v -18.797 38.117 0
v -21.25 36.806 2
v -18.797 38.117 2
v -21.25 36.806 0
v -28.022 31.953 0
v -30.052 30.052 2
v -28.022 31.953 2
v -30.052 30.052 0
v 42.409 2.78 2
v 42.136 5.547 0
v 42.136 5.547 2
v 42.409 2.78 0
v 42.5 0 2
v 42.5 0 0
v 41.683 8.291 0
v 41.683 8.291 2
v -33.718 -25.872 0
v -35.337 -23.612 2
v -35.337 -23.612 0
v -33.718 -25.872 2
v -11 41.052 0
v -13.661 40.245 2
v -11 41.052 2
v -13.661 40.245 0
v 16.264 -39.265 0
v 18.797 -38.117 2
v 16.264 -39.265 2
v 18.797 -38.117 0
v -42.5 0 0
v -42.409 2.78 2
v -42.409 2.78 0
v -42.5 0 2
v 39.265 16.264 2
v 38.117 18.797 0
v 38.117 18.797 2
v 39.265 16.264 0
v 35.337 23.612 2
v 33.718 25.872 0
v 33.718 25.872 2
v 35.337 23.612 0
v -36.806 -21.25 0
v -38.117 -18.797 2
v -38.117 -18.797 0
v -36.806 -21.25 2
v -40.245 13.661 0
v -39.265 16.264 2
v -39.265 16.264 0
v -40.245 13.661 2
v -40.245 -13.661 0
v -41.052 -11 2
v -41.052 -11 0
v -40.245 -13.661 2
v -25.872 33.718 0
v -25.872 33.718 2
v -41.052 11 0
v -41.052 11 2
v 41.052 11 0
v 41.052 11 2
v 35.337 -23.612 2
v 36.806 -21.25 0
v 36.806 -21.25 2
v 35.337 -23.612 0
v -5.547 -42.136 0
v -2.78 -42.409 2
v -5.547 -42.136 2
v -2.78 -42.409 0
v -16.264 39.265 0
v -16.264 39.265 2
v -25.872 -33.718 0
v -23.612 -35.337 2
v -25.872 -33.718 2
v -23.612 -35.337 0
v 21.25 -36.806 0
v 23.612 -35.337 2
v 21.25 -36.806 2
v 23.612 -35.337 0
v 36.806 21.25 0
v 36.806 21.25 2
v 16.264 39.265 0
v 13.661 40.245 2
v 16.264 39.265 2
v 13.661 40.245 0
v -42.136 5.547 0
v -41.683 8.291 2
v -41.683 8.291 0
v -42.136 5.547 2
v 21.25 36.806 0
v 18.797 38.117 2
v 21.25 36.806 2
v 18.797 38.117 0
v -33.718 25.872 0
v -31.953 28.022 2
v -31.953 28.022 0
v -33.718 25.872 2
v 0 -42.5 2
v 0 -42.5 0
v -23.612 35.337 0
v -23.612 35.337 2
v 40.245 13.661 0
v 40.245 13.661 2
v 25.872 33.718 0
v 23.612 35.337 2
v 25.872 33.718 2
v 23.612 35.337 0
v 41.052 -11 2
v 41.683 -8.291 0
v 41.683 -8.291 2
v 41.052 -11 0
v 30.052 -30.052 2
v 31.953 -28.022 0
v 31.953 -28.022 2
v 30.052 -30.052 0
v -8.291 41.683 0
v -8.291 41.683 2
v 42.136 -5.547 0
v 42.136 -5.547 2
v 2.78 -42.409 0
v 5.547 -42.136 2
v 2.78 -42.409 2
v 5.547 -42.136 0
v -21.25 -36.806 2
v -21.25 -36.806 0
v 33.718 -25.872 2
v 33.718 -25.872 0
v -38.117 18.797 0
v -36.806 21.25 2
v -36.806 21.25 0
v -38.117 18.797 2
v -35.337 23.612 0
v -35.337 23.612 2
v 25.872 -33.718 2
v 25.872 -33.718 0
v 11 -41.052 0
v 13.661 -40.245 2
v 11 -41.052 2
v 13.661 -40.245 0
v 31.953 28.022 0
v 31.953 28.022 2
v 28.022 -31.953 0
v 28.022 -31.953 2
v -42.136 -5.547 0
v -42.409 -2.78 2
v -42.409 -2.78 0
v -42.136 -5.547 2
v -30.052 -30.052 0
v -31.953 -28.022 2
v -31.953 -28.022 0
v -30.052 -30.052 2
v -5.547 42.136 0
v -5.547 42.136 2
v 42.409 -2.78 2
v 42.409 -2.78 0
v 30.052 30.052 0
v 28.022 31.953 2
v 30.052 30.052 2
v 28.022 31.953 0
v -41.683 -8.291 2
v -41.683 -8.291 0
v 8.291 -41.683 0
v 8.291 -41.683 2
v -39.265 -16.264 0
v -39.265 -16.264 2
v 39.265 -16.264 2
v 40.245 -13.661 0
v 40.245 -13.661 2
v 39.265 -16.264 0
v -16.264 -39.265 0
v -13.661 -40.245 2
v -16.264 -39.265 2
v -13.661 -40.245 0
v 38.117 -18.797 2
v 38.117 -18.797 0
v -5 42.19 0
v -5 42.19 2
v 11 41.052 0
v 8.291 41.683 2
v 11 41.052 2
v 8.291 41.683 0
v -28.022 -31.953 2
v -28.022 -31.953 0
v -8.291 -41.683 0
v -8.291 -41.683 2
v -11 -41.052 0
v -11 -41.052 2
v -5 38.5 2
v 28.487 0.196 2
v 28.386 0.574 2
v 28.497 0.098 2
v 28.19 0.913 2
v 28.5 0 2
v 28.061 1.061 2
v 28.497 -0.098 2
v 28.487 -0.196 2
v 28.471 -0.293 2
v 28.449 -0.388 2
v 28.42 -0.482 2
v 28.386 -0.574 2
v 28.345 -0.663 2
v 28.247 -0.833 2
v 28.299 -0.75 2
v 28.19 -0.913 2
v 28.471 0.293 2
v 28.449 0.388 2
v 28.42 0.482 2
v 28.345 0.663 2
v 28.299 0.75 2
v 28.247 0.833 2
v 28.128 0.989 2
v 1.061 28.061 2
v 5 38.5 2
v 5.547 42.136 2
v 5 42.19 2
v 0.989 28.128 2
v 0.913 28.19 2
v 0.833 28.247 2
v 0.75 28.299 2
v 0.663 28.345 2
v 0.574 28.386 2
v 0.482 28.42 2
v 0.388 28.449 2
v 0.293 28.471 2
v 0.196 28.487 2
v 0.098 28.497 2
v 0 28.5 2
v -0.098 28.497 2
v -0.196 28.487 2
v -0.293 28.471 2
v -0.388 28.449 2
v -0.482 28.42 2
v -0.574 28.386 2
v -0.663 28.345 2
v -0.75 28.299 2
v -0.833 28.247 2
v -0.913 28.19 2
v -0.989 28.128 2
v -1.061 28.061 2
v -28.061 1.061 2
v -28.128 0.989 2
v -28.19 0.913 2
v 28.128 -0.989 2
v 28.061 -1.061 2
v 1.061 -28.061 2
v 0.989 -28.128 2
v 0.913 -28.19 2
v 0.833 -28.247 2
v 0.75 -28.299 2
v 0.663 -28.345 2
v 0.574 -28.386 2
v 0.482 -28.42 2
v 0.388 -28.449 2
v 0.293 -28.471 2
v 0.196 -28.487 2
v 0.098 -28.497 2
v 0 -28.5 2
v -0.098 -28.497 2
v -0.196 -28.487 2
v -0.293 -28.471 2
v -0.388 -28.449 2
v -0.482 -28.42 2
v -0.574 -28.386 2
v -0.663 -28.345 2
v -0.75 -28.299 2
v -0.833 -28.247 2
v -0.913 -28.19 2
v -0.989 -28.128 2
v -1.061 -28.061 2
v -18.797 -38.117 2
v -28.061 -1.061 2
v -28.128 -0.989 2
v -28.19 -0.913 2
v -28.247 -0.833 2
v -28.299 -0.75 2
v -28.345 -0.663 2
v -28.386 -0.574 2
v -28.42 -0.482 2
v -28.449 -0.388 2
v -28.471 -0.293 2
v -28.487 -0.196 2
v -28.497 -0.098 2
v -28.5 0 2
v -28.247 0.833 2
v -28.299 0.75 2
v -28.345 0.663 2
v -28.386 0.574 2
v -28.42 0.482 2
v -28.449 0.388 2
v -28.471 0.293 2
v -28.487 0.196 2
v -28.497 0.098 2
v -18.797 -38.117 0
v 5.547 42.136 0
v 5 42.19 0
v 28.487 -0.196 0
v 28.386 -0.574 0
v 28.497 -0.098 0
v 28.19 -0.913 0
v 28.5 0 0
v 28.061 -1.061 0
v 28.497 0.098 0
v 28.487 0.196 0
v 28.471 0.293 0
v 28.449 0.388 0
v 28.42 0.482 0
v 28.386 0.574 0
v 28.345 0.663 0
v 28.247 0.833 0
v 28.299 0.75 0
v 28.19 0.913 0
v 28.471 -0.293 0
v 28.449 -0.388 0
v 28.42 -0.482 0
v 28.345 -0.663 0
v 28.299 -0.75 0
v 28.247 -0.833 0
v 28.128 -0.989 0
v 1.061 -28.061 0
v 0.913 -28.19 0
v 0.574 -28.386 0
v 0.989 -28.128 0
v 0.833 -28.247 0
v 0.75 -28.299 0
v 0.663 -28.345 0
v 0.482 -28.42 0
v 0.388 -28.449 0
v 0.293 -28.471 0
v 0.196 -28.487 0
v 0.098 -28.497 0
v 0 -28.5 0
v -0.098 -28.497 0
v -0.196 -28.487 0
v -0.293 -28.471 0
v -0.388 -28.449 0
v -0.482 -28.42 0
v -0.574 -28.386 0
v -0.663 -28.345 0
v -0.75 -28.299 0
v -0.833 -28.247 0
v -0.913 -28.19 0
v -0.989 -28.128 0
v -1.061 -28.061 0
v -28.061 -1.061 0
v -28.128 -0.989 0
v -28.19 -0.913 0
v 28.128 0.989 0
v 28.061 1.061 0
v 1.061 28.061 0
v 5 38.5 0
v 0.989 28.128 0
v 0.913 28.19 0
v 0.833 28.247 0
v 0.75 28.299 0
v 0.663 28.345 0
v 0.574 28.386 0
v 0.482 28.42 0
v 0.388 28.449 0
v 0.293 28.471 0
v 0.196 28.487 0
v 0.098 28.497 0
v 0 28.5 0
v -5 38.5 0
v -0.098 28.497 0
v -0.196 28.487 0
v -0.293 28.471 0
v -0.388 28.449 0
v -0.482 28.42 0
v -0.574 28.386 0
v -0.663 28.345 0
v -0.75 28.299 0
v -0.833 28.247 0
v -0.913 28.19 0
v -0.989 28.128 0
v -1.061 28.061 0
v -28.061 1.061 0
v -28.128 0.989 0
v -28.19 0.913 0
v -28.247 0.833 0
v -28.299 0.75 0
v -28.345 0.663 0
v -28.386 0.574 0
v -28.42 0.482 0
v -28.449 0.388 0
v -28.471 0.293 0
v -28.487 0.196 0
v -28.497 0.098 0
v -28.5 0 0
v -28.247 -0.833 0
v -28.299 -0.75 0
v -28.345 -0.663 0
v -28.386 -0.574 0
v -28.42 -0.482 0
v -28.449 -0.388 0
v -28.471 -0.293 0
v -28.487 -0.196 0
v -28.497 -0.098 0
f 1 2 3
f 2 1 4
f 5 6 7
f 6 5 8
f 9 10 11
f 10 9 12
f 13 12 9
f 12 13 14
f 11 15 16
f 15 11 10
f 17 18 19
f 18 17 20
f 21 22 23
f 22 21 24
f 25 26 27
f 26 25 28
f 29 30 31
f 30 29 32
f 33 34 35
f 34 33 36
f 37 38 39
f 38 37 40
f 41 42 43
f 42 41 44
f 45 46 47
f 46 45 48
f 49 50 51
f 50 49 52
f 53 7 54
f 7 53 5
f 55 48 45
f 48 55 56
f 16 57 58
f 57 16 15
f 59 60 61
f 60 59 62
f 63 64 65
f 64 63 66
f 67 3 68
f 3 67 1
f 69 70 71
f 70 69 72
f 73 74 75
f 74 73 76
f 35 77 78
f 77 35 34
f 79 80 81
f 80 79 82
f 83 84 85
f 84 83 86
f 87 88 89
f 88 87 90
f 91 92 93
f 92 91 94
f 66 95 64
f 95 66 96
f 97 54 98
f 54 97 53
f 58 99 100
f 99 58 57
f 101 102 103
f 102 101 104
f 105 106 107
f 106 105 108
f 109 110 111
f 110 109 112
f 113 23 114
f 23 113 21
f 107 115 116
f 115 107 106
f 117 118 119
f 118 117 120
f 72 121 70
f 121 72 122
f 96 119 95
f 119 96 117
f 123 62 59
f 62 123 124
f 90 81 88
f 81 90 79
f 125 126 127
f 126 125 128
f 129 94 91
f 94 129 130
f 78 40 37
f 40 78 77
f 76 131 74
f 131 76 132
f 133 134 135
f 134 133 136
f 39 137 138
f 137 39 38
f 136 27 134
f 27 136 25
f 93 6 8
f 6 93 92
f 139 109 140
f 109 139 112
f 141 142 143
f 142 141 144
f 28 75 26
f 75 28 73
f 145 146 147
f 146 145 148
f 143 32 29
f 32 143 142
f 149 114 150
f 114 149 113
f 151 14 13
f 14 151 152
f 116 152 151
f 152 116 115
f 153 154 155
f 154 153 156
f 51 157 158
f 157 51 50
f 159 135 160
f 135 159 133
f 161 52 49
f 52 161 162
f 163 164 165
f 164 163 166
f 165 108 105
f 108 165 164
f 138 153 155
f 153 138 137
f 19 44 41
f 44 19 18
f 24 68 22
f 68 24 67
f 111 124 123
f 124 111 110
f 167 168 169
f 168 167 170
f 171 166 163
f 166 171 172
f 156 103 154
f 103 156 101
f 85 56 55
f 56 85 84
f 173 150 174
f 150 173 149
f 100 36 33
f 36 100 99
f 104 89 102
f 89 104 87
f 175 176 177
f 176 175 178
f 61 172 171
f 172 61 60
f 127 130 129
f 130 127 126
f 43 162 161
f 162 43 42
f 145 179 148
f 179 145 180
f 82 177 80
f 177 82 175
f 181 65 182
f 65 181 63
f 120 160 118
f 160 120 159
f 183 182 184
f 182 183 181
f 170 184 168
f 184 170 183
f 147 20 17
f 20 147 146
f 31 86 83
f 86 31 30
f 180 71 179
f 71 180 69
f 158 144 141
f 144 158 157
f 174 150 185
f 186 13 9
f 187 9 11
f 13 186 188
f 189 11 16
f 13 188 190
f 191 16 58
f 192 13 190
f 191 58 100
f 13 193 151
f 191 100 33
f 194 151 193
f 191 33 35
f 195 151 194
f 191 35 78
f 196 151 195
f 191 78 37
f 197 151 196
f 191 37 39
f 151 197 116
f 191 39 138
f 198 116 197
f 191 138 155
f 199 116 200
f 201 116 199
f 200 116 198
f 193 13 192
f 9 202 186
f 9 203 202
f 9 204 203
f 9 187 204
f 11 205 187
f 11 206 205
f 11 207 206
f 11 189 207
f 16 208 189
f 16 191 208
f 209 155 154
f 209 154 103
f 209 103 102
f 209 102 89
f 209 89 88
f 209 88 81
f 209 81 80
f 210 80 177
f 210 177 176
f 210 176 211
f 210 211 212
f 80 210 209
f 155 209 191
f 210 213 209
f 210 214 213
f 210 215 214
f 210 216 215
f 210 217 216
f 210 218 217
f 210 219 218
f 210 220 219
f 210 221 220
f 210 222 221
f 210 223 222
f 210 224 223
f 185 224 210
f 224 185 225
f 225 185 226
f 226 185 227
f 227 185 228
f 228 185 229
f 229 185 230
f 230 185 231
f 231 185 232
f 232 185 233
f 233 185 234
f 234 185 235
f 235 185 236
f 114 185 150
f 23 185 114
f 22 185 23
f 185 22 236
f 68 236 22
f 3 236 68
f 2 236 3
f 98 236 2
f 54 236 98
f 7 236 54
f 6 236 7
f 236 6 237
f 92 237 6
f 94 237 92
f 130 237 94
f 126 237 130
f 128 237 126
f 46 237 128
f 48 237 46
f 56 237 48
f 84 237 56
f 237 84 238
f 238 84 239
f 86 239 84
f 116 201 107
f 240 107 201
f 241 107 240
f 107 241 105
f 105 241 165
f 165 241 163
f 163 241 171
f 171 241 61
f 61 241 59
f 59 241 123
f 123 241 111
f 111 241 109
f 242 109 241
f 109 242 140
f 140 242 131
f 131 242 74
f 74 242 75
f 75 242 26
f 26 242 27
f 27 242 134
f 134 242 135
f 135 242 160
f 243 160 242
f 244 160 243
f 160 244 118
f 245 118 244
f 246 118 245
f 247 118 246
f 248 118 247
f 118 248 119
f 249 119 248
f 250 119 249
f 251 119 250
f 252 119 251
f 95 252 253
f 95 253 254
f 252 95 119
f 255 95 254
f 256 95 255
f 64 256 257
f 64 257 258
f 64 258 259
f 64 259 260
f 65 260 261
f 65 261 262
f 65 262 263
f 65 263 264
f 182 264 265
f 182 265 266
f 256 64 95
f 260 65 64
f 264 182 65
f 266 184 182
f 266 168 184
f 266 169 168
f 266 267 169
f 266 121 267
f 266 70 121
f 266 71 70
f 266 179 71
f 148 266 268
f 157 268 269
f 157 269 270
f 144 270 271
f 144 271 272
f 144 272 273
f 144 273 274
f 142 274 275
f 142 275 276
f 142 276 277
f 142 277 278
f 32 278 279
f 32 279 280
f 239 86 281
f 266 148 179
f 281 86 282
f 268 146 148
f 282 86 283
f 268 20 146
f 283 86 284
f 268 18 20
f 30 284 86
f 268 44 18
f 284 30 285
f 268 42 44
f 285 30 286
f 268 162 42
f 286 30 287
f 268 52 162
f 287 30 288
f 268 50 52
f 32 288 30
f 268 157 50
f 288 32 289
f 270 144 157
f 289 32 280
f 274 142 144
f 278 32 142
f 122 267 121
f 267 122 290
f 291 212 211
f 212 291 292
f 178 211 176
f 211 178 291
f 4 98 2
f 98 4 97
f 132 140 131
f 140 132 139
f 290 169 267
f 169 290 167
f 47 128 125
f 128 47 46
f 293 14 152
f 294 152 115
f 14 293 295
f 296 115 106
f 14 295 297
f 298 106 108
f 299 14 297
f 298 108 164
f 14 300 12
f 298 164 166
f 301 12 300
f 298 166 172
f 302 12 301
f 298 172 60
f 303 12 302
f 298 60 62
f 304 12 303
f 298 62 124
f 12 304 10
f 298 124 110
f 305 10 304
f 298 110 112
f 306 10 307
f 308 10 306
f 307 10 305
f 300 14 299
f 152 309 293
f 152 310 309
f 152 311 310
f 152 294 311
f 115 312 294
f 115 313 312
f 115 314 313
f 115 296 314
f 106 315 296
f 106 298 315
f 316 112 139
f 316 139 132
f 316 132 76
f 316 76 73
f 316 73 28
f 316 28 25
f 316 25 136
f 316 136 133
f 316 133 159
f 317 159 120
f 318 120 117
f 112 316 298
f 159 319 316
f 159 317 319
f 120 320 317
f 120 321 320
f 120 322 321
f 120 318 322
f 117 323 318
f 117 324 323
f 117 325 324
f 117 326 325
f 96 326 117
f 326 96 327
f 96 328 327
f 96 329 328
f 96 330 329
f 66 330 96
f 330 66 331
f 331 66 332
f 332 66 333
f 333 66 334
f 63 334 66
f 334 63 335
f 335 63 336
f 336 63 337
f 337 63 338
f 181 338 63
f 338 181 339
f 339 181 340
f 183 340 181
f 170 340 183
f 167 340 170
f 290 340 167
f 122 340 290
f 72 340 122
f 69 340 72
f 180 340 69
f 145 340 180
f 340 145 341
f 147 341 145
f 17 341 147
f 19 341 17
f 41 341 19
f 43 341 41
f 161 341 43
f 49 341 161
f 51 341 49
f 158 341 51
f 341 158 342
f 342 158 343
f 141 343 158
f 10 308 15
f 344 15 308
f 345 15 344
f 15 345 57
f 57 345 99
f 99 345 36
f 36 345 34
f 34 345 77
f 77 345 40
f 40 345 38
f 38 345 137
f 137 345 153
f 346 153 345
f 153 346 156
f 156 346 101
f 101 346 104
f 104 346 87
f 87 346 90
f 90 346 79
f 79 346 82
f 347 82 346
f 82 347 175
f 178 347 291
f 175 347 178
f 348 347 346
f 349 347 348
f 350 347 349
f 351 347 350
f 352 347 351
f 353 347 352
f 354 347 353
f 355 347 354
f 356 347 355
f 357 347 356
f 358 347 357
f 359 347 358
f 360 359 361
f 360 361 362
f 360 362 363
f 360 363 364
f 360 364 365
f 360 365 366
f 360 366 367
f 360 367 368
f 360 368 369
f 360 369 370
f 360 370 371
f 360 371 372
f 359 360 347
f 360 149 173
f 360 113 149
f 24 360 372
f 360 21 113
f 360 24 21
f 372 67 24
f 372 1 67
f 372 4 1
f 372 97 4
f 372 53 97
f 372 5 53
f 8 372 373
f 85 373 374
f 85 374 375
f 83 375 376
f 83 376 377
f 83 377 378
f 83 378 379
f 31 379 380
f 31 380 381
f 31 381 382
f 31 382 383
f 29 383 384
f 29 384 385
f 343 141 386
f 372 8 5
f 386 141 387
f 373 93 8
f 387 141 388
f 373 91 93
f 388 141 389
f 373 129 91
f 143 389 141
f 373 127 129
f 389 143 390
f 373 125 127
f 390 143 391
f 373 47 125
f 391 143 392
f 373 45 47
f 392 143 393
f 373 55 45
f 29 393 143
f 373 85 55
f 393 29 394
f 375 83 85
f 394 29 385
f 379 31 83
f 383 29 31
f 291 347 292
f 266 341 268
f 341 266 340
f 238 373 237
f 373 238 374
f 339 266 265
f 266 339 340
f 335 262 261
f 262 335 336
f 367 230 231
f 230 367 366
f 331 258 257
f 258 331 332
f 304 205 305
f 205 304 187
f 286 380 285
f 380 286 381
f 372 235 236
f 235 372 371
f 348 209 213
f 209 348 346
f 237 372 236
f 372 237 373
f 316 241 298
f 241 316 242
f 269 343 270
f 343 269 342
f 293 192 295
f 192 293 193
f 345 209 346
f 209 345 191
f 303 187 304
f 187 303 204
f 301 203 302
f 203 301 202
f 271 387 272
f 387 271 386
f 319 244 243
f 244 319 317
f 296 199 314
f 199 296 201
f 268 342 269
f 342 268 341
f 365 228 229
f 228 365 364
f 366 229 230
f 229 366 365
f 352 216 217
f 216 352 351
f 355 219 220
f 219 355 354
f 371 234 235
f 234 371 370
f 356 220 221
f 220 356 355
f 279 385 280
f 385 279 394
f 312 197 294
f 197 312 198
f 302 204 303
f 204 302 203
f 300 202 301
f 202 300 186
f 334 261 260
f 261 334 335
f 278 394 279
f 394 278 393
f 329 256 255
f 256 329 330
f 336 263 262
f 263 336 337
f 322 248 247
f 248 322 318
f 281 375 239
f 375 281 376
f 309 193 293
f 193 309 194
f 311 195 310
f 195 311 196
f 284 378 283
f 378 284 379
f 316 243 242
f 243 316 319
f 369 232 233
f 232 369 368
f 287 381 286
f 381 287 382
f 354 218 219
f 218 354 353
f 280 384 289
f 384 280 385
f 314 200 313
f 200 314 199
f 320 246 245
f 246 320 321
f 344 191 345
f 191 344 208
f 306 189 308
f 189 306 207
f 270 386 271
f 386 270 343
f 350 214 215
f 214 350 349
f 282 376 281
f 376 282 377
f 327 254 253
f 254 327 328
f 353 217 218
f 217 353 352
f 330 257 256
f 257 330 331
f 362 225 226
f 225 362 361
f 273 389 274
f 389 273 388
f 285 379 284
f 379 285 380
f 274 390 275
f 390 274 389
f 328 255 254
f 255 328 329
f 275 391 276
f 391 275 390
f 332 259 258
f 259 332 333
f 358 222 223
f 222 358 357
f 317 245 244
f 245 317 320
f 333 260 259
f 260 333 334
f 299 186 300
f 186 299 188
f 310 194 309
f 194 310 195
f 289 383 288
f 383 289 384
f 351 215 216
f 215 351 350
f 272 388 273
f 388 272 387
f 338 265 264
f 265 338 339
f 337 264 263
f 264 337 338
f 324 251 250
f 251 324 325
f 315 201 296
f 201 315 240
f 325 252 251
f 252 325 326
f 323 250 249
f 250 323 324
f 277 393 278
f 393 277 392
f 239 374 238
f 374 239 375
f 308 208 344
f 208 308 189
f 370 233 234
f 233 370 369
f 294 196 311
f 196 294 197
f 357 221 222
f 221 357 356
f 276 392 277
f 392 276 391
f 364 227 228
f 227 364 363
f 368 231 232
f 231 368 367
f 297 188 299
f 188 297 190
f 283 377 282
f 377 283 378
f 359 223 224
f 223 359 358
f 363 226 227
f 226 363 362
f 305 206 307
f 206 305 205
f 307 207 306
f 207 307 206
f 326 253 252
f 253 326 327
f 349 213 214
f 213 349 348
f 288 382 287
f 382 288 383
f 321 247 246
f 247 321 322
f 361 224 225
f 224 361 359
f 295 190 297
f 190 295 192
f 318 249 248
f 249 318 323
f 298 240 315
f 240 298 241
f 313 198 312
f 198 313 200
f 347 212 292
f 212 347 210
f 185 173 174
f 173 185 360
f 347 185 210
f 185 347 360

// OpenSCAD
// Petri dish sowing template - flat disc with a 7 x 7 hole grid and a rim notch for orientation
// Units: mm. Print orientation: flat on the bed, z = 0 upward.

$fn = 96;

// ---- Disc ----
disc_d        = 85;    // disc outer diameter
disc_t        = 2;     // disc thickness

// ---- Hole grid ----
hole_n_x      = 7;     // holes along X
hole_n_y      = 7;     // holes along Y
hole_d        = 3;     // through-hole diameter
hole_pitch    = 9;     // centre-to-centre spacing
grid_overlap  = 0.01;  // small overlap so the grid hull fuses cleanly

// ---- Notch ----
notch_w       = 10;    // notch width along X
notch_d       = 4;     // notch depth into the rim along Y

// ---- Cut clearance ----
eps           = 0.5;   // extension of cutters past faces

difference() {
    // Main disc, centred in X/Y, resting on z = 0
    cylinder(d = disc_d, h = disc_t);

    // 7 x 7 hole grid, centred on the disc
    hull() {
        for (i = [0 : hole_n_x - 1])
            translate([-hole_pitch * (hole_n_x - 1) / 2 + i * hole_pitch, 0, 0])
                cylinder(d = hole_d, h = disc_t + 2 * eps);
        for (j = [0 : hole_n_y - 1])
            translate([0, -hole_pitch * (hole_n_y - 1) / 2 + j * hole_pitch, 0])
                cylinder(d = hole_d, h = disc_t + 2 * eps);
    }

    // Rectangular orientation notch on the +Y side, centred on Y
    translate([-notch_w / 2, disc_d / 2 - notch_d, -eps])
        cube([notch_w, notch_d + eps, disc_t + 2 * eps]);
}
